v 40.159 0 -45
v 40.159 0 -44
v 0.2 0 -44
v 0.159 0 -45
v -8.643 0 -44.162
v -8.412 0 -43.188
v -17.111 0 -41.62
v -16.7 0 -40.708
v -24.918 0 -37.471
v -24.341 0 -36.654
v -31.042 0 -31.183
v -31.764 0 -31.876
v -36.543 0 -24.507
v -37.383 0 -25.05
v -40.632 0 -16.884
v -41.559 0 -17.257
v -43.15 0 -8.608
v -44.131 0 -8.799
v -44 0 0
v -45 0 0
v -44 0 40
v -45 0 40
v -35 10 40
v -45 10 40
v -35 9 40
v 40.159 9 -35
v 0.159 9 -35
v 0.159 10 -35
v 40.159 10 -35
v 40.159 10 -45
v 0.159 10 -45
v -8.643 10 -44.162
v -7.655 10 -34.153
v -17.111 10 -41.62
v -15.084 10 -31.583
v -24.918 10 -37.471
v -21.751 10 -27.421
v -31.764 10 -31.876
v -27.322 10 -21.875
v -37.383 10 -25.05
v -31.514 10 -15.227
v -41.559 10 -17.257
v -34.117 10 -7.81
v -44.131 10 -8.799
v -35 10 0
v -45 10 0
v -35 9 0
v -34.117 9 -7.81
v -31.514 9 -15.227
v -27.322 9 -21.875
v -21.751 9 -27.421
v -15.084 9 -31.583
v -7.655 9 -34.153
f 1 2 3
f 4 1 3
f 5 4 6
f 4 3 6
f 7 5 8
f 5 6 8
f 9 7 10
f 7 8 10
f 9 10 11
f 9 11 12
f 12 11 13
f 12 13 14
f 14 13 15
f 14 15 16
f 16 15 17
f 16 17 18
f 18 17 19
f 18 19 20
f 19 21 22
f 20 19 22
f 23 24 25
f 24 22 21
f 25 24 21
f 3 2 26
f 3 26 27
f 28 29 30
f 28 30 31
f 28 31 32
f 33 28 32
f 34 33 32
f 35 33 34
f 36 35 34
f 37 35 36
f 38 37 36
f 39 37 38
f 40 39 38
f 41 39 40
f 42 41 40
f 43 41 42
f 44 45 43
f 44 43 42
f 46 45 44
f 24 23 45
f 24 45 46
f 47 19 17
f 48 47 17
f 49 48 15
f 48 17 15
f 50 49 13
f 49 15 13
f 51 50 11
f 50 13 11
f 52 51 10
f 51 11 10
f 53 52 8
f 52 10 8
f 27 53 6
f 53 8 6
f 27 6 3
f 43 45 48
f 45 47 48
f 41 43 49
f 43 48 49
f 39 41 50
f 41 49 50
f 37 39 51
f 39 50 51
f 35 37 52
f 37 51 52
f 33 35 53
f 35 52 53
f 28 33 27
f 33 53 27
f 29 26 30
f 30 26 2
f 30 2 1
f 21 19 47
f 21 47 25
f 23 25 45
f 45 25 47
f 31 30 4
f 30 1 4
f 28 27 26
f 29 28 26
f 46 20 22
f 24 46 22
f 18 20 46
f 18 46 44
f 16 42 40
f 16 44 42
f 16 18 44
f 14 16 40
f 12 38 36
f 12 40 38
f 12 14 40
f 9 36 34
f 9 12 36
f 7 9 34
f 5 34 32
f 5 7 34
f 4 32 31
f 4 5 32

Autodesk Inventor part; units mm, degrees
ref_plane "YZ Plane" through (0, 0, 0) normal (1, 0, 0) x (0, 1, 0)
ref_plane "XZ Plane" through (0, 0, 0) normal (0, 1, 0) x (-1, 0, 0)
ref_plane "XY Plane" through (0, 0, 0) normal (0, 0, 1) x (1, 0, 0)
sketch "Sketch1" plane through (0, 0, 0) normal (0, 1, 0) x (-1, 0, 0)
  circle A0 centre (0, 0) radius 45
  circle A1 centre (0, 0) radius 35
  line L0 (35, 0) -> (45, 0)
  line L1 (45, 0) -> (45, 40)
  line L2 (45, 40) -> (35, 40)
  line L3 (35, 40) -> (35, 0)
  line L4 (-0.1589, -34.9996) -> (-40.1589, -34.9996)
  line L5 (-40.1589, -34.9996) -> (-40.1589, -44.9997)
  line L6 (-40.1589, -44.9997) -> (-0.1589, -44.9997)
  line L7 (-0.1589, -44.9997) -> (-0.1589, -34.9996)
  point P0 (-0.1589, -44.9997)
  point P1 (45, 0)
  point P2 (-28.2847, -34.9996)
  point P3 (35, 28.2843)
  point P4 (-0.1589, -44.9997)
  dimension "d0" = 90
  dimension "d1" = 70
  dimension "d2" = 40
  dimension "d3" = 40
extrude "Extrusion1" add sketch "Sketch1" along normal blind 10 contours L7 A1 L0 A0 | L6 L5 L4 A0 | A0 L4 L7 | L0 L3 A0 | A0 L3 L2 L1
chamfer "Chamfer1" distance 9 angle 45 3 edges at (-35, 0, 20) (-24.6925, 0, -24.8048) (20.1589, 0, -34.9996)
equation "\"BendRadius\" = Thickness"
equation "\"BendReliefWidth\" = Thickness"
equation "\"BendReliefDepth\" = 0.5 * Thickness"
equation "\"CornerReliefSize\" = 4 * Thickness"
equation "\"MinimumRemnant\" = 2 * Thickness"
equation "\"TransitionRadius\" = BendRadius"
equation "\"JacobiRadiusSize\" = BendRadius"
equation "\"GapSize\" = Thickness"
equation "\"Thickness\" = 0.5"
properties part number "test1"
